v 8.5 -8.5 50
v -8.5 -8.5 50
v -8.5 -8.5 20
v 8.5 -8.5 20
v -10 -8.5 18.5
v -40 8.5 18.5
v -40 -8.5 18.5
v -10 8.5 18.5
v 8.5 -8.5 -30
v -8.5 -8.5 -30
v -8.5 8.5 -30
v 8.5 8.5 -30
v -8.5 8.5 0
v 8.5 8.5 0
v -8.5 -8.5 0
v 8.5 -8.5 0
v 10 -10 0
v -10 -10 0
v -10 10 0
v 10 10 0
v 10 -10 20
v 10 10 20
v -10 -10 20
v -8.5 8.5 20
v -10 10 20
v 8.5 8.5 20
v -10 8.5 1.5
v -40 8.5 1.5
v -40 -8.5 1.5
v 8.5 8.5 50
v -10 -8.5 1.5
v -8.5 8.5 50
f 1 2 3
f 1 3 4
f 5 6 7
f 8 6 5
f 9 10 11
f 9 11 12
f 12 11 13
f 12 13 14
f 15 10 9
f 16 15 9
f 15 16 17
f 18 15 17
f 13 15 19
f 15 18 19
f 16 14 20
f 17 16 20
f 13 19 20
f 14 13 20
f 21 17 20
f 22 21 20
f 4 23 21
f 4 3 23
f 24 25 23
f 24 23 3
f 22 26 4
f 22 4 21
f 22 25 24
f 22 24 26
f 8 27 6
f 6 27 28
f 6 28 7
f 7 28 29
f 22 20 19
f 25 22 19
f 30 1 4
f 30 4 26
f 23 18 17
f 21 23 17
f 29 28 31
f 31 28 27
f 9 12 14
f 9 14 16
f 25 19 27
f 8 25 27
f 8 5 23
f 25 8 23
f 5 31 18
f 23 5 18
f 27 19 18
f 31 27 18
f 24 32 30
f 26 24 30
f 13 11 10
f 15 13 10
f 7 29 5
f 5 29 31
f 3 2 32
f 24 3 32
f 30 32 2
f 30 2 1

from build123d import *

# Parameters (mm, degrees)
F1_DEPTH = 20
F2_START = 1.5
F2_DEPTH = 17
F3_W     = 17
F3_H     = 17
F4_DEPTH = 30
F5_W     = 17
F5_H     = 17
F6_DEPTH = 30


with BuildPart() as f1:
    # F0 (on Top) → F1 (new body)
    with BuildSketch(Plane.XY):
        Polygon((8.5, -10), (10, -10), (10, 10), (-10, 10), (-10, 8.5), (-10, 0), (-10, -8.5), (-10, -10), (-8.5, -10), (0, -10), align=None)
    extrude(amount=F1_DEPTH)

    # F0 (on Top) → F2 (join)
    with BuildSketch(Plane.XY.offset(F2_START)):
        Polygon((-10, 0), (-10, 8.5), (-40, 8.5), (-40, -8.5), (-10, -8.5), align=None)
    extrude(amount=F2_DEPTH)

    # F3 (on face) → F4 (join)
    with BuildSketch(Plane.XY.offset(20)):
        Rectangle(F3_W, F3_H)
    extrude(amount=F4_DEPTH)

    # F5 (on face) → F6 (join)
    with BuildSketch(Plane(origin=(0, 0, 0), x_dir=(1, 0, 0), z_dir=(0, 0, -1))):
        Rectangle(F5_W, F5_H)
    extrude(amount=F6_DEPTH)


solid = f1.part
